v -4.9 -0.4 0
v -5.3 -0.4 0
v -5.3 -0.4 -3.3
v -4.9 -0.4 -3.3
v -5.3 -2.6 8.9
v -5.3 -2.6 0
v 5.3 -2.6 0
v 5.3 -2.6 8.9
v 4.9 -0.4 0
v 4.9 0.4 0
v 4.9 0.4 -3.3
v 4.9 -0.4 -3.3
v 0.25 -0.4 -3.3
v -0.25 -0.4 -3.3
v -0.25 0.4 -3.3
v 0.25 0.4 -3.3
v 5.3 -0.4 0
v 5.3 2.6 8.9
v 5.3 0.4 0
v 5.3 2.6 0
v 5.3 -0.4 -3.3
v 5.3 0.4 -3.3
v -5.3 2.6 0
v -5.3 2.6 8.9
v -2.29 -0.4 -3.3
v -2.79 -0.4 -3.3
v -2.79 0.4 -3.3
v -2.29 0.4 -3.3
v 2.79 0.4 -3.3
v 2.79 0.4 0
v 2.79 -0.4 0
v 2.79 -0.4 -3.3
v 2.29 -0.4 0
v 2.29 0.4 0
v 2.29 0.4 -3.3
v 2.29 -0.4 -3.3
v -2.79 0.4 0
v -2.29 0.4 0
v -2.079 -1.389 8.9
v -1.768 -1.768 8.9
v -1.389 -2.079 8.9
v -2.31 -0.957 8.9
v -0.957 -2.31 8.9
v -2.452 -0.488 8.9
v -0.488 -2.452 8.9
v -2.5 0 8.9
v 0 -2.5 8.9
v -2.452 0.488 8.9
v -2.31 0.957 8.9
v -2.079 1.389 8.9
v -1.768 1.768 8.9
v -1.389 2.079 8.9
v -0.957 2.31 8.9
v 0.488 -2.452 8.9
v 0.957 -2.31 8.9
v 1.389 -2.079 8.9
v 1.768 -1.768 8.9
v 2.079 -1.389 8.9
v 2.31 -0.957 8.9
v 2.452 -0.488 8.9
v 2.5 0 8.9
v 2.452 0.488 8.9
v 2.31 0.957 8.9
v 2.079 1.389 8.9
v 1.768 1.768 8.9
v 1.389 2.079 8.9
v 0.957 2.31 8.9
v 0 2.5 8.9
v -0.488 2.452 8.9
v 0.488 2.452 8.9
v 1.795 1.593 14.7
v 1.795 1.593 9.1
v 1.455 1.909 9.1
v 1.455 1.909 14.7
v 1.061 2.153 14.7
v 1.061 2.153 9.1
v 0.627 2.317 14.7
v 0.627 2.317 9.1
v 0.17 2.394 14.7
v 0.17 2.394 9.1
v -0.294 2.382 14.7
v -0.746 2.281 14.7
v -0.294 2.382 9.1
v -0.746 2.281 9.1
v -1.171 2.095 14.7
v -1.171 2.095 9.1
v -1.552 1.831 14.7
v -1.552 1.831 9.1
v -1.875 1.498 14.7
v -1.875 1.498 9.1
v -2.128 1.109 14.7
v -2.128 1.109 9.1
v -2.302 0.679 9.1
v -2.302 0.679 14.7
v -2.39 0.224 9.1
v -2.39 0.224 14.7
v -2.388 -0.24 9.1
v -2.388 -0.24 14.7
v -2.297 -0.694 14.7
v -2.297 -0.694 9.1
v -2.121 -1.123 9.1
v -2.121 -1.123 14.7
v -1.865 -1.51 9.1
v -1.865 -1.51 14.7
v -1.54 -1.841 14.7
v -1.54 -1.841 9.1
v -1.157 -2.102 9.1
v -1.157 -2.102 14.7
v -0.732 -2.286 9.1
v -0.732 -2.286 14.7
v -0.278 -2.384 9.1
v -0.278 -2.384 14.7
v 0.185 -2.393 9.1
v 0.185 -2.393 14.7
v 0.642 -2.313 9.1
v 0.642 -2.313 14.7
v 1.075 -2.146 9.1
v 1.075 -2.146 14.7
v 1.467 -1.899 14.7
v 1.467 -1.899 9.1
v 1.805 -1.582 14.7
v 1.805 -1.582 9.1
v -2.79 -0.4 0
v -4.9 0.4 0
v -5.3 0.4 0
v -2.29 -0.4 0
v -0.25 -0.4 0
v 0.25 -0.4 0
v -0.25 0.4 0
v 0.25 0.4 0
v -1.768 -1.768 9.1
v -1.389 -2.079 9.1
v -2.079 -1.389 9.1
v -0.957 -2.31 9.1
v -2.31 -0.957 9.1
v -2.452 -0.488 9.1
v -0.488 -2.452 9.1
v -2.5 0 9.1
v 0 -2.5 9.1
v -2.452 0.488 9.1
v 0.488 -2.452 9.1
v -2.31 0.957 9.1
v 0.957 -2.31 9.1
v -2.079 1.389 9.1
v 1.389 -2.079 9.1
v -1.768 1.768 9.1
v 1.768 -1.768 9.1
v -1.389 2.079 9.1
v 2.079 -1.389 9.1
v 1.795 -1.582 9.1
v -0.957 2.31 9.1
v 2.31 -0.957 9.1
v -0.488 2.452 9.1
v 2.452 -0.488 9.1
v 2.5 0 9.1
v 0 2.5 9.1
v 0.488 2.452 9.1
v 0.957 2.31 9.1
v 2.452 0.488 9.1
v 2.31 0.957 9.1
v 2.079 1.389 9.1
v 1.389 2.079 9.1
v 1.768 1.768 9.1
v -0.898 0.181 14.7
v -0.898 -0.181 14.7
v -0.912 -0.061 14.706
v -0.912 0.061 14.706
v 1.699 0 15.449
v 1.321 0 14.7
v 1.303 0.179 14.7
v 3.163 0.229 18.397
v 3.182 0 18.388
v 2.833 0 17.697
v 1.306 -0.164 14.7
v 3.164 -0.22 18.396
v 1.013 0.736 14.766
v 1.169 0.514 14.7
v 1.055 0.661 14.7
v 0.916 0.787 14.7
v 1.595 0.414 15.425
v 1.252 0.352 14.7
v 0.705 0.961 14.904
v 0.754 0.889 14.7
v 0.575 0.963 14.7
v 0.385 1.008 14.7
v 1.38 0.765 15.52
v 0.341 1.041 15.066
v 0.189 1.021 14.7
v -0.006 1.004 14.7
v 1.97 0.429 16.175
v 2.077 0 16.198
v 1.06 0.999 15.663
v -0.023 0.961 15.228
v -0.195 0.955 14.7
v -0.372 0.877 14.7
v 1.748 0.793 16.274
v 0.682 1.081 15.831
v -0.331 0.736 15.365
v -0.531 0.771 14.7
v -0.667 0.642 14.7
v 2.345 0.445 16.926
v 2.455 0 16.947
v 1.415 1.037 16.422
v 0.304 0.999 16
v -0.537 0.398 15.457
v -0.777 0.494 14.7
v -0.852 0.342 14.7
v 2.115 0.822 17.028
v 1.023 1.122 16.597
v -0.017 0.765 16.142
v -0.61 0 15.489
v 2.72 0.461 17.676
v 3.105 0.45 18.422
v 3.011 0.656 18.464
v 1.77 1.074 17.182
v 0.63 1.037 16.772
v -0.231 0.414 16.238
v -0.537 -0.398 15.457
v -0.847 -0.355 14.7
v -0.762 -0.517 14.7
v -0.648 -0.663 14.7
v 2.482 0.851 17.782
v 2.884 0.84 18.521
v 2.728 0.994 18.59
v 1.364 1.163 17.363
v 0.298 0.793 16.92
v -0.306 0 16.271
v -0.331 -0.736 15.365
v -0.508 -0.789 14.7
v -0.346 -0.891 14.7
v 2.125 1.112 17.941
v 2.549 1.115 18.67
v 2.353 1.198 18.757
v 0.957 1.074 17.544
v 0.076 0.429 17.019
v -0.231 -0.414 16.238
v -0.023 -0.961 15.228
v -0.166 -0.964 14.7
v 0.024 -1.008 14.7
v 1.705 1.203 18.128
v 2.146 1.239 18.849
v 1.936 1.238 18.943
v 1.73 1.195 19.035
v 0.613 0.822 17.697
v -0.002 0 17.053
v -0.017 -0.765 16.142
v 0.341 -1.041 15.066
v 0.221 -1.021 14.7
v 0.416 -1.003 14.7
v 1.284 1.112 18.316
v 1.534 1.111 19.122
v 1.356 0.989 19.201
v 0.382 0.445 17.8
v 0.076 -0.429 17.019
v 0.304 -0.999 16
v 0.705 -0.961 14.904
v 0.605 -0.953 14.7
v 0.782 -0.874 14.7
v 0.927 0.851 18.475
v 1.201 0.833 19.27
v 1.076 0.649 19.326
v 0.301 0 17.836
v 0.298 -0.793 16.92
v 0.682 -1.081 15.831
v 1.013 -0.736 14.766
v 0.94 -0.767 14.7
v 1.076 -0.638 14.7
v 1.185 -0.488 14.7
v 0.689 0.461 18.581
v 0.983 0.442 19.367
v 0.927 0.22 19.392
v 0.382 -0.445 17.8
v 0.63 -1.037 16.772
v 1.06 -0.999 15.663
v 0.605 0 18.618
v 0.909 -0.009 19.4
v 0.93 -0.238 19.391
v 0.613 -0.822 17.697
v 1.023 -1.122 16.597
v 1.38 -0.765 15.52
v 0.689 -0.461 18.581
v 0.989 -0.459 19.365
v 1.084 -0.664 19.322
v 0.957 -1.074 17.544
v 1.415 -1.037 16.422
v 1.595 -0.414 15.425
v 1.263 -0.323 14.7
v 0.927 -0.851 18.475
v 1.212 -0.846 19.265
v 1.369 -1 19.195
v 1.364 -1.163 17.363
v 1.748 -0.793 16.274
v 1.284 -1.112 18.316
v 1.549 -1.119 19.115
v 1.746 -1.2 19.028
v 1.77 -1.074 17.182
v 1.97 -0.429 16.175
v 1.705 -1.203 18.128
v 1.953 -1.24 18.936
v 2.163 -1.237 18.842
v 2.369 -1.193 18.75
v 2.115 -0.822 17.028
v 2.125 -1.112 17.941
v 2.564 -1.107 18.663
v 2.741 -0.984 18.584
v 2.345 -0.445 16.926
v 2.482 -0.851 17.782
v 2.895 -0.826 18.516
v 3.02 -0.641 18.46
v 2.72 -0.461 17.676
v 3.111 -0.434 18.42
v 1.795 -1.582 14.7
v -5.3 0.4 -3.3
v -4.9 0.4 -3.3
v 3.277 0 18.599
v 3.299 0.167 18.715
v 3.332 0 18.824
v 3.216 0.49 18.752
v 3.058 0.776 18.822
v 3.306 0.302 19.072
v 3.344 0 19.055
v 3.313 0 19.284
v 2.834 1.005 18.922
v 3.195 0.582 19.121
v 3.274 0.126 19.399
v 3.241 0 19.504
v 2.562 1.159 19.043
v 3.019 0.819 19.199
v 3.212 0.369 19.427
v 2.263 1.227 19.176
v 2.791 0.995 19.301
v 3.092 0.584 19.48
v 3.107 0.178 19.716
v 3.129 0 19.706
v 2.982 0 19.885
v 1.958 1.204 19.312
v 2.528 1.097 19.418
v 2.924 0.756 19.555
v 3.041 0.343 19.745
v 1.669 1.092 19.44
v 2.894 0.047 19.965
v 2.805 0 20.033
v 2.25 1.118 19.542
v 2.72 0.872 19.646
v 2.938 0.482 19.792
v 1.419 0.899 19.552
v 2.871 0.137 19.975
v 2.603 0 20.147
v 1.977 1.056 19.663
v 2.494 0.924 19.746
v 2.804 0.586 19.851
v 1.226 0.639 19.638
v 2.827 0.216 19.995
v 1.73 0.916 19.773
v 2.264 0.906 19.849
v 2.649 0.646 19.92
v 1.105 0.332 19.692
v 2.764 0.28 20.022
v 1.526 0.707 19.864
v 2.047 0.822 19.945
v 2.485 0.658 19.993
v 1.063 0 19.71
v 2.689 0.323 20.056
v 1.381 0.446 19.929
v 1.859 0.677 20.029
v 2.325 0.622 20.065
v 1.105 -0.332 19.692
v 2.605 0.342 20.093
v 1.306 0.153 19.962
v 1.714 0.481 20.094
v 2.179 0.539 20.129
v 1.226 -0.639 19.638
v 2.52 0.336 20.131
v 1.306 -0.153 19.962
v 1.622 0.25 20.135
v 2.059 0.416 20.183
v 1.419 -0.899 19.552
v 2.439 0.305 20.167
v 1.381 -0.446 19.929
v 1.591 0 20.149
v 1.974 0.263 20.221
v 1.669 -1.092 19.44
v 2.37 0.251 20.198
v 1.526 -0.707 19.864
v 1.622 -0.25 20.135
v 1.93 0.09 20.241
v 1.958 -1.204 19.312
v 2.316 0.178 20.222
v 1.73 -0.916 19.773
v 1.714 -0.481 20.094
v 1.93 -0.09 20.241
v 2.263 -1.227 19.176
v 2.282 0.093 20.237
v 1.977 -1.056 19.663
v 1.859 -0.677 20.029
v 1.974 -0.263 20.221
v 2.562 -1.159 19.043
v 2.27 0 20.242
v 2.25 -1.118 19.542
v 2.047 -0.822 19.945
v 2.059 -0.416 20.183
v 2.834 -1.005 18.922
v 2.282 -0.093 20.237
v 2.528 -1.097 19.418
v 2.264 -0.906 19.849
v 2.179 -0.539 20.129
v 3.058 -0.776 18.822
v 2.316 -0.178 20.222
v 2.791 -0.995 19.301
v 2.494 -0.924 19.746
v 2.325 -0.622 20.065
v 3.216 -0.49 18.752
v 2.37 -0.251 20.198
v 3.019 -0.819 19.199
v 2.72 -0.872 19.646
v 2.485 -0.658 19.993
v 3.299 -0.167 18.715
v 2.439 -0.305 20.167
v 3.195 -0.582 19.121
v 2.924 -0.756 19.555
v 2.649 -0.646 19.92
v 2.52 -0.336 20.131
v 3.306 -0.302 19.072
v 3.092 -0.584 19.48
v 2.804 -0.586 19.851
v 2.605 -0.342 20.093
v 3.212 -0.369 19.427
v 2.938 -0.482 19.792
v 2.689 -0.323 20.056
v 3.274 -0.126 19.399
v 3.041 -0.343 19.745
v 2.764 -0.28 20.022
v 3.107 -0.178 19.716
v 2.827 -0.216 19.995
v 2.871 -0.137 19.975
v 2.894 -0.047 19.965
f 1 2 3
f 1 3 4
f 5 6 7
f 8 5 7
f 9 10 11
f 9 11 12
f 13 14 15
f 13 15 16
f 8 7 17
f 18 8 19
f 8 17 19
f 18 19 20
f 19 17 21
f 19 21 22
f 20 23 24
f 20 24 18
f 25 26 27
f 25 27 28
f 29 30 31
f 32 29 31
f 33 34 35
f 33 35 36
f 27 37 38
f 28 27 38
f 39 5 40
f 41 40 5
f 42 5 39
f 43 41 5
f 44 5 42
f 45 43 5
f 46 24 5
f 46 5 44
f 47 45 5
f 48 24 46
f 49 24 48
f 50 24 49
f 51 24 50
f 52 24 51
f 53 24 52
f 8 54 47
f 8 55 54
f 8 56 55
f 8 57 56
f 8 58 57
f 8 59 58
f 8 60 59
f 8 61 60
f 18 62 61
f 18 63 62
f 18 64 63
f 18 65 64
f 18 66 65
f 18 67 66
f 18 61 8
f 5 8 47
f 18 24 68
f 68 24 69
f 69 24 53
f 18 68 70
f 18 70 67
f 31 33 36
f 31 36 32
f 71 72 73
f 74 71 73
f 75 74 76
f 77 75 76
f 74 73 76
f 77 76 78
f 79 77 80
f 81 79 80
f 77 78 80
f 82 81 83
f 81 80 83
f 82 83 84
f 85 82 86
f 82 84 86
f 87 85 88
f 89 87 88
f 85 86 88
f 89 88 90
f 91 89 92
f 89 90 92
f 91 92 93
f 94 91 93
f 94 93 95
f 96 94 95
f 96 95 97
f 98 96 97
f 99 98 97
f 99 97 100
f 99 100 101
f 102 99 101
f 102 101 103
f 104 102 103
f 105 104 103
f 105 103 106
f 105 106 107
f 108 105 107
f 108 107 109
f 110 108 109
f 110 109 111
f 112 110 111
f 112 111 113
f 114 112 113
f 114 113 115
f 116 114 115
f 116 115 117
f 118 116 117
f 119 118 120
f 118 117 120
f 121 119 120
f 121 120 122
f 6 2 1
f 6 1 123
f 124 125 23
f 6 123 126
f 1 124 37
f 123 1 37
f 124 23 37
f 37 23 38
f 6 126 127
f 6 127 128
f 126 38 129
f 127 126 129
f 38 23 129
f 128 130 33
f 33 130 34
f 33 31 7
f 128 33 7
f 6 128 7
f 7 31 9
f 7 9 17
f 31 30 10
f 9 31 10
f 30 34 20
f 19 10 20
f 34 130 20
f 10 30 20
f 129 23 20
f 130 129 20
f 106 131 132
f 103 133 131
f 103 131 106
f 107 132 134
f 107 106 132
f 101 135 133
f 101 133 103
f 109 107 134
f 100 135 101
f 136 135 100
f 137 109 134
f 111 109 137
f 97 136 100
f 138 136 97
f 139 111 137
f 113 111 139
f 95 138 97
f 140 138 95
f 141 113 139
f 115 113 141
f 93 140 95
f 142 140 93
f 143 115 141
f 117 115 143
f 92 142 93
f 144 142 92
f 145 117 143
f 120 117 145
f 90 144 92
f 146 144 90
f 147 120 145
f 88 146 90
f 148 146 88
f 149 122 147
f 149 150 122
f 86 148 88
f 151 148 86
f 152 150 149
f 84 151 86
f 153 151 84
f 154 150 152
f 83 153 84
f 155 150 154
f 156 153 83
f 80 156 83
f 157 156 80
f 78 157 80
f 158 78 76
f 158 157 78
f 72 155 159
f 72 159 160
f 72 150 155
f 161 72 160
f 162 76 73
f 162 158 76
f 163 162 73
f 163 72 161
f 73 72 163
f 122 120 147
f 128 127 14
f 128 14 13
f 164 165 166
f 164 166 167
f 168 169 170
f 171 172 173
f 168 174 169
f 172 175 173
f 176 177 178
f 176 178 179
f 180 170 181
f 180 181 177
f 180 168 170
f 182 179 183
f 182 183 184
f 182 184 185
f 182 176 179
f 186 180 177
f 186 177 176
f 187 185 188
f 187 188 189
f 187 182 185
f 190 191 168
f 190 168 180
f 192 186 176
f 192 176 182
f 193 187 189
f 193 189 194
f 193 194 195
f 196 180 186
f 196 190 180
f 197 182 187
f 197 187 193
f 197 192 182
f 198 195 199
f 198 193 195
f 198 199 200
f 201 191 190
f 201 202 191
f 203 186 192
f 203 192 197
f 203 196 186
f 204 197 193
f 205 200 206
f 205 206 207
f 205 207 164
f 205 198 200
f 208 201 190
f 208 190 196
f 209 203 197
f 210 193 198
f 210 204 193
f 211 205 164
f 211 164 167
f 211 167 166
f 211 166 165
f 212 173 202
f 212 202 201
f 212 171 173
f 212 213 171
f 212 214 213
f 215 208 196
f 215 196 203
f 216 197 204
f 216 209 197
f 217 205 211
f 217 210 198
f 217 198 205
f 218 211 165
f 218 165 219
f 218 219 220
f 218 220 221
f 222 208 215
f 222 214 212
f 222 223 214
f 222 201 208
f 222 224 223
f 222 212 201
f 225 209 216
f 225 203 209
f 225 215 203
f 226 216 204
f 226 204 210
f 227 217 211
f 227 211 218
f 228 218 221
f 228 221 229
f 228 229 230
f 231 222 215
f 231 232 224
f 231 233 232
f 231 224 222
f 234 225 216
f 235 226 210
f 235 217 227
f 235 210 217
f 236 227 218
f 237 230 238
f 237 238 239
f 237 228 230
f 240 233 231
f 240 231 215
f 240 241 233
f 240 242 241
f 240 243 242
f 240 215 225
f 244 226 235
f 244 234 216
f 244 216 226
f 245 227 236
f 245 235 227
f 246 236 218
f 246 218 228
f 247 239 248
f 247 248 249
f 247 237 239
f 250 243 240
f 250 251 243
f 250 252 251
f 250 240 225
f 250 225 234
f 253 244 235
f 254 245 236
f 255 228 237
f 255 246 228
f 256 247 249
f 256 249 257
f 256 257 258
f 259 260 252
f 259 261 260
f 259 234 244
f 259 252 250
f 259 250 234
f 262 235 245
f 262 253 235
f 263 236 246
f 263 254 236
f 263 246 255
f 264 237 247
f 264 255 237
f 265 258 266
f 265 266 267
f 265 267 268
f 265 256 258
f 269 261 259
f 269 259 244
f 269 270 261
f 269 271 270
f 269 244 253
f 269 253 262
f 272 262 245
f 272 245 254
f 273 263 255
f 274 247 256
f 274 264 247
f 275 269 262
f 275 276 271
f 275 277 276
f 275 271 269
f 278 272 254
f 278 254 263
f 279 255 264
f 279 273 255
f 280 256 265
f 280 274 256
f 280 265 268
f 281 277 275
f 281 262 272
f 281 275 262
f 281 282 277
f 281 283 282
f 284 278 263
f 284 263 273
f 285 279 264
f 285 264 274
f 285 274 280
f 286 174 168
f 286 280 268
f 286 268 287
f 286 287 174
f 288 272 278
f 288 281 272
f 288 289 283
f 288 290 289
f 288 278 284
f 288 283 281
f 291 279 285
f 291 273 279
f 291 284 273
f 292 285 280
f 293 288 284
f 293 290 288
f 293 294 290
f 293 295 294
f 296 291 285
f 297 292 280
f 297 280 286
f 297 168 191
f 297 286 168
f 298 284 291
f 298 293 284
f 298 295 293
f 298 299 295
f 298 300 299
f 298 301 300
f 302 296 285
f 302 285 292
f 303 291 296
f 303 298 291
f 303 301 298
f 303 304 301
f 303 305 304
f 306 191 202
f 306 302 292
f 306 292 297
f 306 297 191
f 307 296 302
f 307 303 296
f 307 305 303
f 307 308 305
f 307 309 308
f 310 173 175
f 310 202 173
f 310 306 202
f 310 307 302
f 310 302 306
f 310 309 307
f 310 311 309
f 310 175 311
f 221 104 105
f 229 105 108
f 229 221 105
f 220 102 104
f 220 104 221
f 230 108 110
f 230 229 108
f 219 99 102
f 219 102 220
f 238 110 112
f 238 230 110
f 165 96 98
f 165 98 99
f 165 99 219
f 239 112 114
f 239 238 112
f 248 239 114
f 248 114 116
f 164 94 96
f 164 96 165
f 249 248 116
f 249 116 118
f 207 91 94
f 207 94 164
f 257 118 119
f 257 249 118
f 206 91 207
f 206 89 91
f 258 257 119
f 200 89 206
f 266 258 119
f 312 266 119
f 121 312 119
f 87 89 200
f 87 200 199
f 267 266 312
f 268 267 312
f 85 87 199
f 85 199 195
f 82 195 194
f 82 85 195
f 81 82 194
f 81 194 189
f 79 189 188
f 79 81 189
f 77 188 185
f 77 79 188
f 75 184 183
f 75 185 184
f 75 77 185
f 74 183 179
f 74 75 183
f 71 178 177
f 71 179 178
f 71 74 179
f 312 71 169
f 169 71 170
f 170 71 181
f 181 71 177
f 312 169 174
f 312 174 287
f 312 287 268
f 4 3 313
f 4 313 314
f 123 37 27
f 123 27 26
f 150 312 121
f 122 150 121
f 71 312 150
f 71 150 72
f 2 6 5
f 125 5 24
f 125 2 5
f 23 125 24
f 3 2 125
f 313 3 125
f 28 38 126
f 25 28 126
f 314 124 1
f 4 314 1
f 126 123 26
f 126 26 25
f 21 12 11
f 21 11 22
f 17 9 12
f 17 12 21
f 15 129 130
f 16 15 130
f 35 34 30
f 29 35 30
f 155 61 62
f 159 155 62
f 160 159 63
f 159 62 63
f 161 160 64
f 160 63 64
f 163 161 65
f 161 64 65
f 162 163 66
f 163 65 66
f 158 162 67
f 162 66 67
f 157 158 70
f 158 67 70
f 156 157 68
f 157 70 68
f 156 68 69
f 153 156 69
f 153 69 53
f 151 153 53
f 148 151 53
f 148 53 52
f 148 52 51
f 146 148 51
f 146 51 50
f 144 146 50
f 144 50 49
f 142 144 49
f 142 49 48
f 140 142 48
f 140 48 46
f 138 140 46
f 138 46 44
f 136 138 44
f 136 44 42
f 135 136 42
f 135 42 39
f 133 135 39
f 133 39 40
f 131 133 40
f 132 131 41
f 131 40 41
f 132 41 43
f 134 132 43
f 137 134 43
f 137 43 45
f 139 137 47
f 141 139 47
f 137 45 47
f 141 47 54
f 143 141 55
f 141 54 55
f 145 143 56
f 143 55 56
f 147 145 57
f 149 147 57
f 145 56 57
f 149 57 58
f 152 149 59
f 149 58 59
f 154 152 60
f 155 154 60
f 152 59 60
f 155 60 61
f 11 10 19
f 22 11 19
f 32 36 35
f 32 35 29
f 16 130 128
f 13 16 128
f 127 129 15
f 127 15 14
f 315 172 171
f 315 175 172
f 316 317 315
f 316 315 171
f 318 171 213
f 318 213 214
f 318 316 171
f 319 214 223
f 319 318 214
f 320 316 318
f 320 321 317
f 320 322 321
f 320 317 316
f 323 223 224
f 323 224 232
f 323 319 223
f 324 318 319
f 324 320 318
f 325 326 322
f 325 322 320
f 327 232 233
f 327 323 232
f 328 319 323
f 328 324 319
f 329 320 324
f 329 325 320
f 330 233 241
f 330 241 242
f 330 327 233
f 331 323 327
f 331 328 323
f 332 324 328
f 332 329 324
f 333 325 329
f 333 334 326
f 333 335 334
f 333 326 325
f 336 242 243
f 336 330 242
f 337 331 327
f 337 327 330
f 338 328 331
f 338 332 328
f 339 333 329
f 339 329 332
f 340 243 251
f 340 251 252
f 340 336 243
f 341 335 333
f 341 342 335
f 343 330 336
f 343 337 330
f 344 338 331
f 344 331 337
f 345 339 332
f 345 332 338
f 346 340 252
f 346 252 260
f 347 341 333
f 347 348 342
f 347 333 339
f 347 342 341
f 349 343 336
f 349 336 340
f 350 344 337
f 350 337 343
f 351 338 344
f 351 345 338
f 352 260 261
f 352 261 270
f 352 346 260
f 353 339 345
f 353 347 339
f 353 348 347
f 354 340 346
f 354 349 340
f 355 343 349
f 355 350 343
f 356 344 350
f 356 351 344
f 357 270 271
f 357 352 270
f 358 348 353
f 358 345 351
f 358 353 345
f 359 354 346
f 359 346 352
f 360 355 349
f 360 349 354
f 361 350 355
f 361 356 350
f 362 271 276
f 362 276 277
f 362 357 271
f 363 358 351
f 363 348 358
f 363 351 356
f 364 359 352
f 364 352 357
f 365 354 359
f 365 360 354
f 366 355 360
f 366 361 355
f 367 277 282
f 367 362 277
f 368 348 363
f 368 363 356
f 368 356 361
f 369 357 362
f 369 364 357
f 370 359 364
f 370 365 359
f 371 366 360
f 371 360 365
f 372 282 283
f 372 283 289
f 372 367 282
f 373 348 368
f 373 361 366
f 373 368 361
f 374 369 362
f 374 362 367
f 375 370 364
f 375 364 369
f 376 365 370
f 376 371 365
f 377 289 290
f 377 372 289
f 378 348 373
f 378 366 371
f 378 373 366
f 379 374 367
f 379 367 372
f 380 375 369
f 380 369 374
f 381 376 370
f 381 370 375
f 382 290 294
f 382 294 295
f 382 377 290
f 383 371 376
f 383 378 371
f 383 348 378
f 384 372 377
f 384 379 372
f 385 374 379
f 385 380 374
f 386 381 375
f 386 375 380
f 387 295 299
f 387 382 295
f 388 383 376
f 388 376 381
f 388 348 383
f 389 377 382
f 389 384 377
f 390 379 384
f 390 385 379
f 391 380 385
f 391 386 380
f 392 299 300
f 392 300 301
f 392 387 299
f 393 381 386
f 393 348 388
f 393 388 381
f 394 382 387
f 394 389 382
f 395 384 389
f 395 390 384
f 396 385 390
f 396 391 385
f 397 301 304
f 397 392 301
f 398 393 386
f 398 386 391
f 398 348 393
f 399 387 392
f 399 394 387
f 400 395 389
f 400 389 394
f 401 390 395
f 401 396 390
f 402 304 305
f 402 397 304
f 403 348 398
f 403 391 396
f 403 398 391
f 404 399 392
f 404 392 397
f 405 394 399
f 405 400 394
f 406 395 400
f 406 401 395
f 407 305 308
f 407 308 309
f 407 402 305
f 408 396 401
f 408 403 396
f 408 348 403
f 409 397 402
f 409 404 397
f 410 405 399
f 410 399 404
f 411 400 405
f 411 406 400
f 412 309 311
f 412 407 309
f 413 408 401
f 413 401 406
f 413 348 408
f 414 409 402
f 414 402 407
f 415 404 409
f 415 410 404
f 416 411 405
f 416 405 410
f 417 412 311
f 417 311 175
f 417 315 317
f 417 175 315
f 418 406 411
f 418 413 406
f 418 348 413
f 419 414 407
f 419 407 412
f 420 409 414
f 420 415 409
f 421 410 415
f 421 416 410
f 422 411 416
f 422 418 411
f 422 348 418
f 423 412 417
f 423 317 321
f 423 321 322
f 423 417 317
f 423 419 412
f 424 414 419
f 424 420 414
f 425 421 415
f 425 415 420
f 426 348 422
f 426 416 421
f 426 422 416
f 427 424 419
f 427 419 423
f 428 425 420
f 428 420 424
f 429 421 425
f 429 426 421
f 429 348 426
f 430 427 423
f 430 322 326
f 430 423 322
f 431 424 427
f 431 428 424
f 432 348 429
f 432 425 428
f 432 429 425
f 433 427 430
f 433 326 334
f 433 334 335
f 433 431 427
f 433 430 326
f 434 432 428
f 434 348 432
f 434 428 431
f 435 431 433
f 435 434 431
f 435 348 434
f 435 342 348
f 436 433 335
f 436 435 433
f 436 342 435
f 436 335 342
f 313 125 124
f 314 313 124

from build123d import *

# Parameters (mm, degrees)
SKETCH_W      = 10.6
SKETCH_H      = 5.2
PAD_DEPTH     = 8.9
SKETCH001_R   = 2.5
PAD001_DEPTH  = 0.2
SKETCH002_R   = 2.4
PAD002_DEPTH  = 5.6
SKETCH003_W   = 0.5
SKETCH003_H   = 0.8
SKETCH003_W_2 = 0.4
PAD003_DEPTH  = 3.3
SKETCH004_W   = 5.3
SKETCH004_H   = 3.175016
POCKET_DEPTH  = 5.6


with BuildPart() as part:
    # Sketch → Pad (new body)
    with BuildSketch(Plane.XY):
        Rectangle(SKETCH_W, SKETCH_H)
    extrude(amount=PAD_DEPTH)

    # Sketch001 (on Face6 of Pad) → Pad001 (join)
    with BuildSketch(Plane.XY.offset(8.9)):
        Circle(SKETCH001_R)
    extrude(amount=PAD001_DEPTH)

    # Sketch002 (on Face8 of Pad001) → Pad002 (join)
    with BuildSketch(Plane.XY.offset(9.1)):
        Circle(SKETCH002_R)
    extrude(amount=PAD002_DEPTH)

    # Sketch003 (on Face4 of Pad002) → Pad003 (join)
    with BuildSketch(Plane(origin=(0, 0, 0), x_dir=(1, 0, 0), z_dir=(0, 0, -1))):
        Rectangle(SKETCH003_W, SKETCH003_H)
        with Locations((-2.54, 0)):
            Rectangle(SKETCH003_W, SKETCH003_H)
        with Locations((2.54, 0)):
            Rectangle(SKETCH003_W, SKETCH003_H)
        with Locations((-5.1, 0)):
            Rectangle(SKETCH003_W_2, SKETCH003_H)
        with Locations((5.1, 0)):
            Rectangle(SKETCH003_W_2, SKETCH003_H)
    extrude(amount=PAD003_DEPTH)

    # Cone → Cone (revolve)
    with BuildSketch(Plane(origin=(0, 0, 14.3), x_dir=(0.9135454576, 0, -0.4067366431), z_dir=(0, -1, 0))):
        Polygon((0, 0), (1, 0), (1.25, 5.15), (0, 5.15), align=None)
    revolve(axis=Axis((0, 0, 14.3), (0.4067366431, 0, 0.9135454576)))

    # Sphere → Sphere (revolve)
    with BuildSketch(Plane(origin=(2.0946937118, 0, 19.0047591069), x_dir=(0.9135454576, 0, -0.4067366431), z_dir=(0, -1, 0))):
        with BuildLine():
            ThreePointArc((0, -1.25), (1.25, 0), (0, 1.25))
            Line((0, 1.25), (0, -1.25))
        make_face()
    revolve(axis=Axis((2.0946937118, 0, 19.0047591069), (0.4067366431, 0, 0.9135454576)))

    # Sketch004 (on Face35 of Sphere) → Pocket (cut)
    with BuildSketch(Plane(origin=(2.0946937118, 0, 14.7), x_dir=(1, 0, 0), z_dir=(0, 0, 1))):
        with Locations((2.35, 0.005894)):
            Rectangle(SKETCH004_W, SKETCH004_H)
    extrude(amount=-POCKET_DEPTH, mode=Mode.SUBTRACT)


solid = part.part
